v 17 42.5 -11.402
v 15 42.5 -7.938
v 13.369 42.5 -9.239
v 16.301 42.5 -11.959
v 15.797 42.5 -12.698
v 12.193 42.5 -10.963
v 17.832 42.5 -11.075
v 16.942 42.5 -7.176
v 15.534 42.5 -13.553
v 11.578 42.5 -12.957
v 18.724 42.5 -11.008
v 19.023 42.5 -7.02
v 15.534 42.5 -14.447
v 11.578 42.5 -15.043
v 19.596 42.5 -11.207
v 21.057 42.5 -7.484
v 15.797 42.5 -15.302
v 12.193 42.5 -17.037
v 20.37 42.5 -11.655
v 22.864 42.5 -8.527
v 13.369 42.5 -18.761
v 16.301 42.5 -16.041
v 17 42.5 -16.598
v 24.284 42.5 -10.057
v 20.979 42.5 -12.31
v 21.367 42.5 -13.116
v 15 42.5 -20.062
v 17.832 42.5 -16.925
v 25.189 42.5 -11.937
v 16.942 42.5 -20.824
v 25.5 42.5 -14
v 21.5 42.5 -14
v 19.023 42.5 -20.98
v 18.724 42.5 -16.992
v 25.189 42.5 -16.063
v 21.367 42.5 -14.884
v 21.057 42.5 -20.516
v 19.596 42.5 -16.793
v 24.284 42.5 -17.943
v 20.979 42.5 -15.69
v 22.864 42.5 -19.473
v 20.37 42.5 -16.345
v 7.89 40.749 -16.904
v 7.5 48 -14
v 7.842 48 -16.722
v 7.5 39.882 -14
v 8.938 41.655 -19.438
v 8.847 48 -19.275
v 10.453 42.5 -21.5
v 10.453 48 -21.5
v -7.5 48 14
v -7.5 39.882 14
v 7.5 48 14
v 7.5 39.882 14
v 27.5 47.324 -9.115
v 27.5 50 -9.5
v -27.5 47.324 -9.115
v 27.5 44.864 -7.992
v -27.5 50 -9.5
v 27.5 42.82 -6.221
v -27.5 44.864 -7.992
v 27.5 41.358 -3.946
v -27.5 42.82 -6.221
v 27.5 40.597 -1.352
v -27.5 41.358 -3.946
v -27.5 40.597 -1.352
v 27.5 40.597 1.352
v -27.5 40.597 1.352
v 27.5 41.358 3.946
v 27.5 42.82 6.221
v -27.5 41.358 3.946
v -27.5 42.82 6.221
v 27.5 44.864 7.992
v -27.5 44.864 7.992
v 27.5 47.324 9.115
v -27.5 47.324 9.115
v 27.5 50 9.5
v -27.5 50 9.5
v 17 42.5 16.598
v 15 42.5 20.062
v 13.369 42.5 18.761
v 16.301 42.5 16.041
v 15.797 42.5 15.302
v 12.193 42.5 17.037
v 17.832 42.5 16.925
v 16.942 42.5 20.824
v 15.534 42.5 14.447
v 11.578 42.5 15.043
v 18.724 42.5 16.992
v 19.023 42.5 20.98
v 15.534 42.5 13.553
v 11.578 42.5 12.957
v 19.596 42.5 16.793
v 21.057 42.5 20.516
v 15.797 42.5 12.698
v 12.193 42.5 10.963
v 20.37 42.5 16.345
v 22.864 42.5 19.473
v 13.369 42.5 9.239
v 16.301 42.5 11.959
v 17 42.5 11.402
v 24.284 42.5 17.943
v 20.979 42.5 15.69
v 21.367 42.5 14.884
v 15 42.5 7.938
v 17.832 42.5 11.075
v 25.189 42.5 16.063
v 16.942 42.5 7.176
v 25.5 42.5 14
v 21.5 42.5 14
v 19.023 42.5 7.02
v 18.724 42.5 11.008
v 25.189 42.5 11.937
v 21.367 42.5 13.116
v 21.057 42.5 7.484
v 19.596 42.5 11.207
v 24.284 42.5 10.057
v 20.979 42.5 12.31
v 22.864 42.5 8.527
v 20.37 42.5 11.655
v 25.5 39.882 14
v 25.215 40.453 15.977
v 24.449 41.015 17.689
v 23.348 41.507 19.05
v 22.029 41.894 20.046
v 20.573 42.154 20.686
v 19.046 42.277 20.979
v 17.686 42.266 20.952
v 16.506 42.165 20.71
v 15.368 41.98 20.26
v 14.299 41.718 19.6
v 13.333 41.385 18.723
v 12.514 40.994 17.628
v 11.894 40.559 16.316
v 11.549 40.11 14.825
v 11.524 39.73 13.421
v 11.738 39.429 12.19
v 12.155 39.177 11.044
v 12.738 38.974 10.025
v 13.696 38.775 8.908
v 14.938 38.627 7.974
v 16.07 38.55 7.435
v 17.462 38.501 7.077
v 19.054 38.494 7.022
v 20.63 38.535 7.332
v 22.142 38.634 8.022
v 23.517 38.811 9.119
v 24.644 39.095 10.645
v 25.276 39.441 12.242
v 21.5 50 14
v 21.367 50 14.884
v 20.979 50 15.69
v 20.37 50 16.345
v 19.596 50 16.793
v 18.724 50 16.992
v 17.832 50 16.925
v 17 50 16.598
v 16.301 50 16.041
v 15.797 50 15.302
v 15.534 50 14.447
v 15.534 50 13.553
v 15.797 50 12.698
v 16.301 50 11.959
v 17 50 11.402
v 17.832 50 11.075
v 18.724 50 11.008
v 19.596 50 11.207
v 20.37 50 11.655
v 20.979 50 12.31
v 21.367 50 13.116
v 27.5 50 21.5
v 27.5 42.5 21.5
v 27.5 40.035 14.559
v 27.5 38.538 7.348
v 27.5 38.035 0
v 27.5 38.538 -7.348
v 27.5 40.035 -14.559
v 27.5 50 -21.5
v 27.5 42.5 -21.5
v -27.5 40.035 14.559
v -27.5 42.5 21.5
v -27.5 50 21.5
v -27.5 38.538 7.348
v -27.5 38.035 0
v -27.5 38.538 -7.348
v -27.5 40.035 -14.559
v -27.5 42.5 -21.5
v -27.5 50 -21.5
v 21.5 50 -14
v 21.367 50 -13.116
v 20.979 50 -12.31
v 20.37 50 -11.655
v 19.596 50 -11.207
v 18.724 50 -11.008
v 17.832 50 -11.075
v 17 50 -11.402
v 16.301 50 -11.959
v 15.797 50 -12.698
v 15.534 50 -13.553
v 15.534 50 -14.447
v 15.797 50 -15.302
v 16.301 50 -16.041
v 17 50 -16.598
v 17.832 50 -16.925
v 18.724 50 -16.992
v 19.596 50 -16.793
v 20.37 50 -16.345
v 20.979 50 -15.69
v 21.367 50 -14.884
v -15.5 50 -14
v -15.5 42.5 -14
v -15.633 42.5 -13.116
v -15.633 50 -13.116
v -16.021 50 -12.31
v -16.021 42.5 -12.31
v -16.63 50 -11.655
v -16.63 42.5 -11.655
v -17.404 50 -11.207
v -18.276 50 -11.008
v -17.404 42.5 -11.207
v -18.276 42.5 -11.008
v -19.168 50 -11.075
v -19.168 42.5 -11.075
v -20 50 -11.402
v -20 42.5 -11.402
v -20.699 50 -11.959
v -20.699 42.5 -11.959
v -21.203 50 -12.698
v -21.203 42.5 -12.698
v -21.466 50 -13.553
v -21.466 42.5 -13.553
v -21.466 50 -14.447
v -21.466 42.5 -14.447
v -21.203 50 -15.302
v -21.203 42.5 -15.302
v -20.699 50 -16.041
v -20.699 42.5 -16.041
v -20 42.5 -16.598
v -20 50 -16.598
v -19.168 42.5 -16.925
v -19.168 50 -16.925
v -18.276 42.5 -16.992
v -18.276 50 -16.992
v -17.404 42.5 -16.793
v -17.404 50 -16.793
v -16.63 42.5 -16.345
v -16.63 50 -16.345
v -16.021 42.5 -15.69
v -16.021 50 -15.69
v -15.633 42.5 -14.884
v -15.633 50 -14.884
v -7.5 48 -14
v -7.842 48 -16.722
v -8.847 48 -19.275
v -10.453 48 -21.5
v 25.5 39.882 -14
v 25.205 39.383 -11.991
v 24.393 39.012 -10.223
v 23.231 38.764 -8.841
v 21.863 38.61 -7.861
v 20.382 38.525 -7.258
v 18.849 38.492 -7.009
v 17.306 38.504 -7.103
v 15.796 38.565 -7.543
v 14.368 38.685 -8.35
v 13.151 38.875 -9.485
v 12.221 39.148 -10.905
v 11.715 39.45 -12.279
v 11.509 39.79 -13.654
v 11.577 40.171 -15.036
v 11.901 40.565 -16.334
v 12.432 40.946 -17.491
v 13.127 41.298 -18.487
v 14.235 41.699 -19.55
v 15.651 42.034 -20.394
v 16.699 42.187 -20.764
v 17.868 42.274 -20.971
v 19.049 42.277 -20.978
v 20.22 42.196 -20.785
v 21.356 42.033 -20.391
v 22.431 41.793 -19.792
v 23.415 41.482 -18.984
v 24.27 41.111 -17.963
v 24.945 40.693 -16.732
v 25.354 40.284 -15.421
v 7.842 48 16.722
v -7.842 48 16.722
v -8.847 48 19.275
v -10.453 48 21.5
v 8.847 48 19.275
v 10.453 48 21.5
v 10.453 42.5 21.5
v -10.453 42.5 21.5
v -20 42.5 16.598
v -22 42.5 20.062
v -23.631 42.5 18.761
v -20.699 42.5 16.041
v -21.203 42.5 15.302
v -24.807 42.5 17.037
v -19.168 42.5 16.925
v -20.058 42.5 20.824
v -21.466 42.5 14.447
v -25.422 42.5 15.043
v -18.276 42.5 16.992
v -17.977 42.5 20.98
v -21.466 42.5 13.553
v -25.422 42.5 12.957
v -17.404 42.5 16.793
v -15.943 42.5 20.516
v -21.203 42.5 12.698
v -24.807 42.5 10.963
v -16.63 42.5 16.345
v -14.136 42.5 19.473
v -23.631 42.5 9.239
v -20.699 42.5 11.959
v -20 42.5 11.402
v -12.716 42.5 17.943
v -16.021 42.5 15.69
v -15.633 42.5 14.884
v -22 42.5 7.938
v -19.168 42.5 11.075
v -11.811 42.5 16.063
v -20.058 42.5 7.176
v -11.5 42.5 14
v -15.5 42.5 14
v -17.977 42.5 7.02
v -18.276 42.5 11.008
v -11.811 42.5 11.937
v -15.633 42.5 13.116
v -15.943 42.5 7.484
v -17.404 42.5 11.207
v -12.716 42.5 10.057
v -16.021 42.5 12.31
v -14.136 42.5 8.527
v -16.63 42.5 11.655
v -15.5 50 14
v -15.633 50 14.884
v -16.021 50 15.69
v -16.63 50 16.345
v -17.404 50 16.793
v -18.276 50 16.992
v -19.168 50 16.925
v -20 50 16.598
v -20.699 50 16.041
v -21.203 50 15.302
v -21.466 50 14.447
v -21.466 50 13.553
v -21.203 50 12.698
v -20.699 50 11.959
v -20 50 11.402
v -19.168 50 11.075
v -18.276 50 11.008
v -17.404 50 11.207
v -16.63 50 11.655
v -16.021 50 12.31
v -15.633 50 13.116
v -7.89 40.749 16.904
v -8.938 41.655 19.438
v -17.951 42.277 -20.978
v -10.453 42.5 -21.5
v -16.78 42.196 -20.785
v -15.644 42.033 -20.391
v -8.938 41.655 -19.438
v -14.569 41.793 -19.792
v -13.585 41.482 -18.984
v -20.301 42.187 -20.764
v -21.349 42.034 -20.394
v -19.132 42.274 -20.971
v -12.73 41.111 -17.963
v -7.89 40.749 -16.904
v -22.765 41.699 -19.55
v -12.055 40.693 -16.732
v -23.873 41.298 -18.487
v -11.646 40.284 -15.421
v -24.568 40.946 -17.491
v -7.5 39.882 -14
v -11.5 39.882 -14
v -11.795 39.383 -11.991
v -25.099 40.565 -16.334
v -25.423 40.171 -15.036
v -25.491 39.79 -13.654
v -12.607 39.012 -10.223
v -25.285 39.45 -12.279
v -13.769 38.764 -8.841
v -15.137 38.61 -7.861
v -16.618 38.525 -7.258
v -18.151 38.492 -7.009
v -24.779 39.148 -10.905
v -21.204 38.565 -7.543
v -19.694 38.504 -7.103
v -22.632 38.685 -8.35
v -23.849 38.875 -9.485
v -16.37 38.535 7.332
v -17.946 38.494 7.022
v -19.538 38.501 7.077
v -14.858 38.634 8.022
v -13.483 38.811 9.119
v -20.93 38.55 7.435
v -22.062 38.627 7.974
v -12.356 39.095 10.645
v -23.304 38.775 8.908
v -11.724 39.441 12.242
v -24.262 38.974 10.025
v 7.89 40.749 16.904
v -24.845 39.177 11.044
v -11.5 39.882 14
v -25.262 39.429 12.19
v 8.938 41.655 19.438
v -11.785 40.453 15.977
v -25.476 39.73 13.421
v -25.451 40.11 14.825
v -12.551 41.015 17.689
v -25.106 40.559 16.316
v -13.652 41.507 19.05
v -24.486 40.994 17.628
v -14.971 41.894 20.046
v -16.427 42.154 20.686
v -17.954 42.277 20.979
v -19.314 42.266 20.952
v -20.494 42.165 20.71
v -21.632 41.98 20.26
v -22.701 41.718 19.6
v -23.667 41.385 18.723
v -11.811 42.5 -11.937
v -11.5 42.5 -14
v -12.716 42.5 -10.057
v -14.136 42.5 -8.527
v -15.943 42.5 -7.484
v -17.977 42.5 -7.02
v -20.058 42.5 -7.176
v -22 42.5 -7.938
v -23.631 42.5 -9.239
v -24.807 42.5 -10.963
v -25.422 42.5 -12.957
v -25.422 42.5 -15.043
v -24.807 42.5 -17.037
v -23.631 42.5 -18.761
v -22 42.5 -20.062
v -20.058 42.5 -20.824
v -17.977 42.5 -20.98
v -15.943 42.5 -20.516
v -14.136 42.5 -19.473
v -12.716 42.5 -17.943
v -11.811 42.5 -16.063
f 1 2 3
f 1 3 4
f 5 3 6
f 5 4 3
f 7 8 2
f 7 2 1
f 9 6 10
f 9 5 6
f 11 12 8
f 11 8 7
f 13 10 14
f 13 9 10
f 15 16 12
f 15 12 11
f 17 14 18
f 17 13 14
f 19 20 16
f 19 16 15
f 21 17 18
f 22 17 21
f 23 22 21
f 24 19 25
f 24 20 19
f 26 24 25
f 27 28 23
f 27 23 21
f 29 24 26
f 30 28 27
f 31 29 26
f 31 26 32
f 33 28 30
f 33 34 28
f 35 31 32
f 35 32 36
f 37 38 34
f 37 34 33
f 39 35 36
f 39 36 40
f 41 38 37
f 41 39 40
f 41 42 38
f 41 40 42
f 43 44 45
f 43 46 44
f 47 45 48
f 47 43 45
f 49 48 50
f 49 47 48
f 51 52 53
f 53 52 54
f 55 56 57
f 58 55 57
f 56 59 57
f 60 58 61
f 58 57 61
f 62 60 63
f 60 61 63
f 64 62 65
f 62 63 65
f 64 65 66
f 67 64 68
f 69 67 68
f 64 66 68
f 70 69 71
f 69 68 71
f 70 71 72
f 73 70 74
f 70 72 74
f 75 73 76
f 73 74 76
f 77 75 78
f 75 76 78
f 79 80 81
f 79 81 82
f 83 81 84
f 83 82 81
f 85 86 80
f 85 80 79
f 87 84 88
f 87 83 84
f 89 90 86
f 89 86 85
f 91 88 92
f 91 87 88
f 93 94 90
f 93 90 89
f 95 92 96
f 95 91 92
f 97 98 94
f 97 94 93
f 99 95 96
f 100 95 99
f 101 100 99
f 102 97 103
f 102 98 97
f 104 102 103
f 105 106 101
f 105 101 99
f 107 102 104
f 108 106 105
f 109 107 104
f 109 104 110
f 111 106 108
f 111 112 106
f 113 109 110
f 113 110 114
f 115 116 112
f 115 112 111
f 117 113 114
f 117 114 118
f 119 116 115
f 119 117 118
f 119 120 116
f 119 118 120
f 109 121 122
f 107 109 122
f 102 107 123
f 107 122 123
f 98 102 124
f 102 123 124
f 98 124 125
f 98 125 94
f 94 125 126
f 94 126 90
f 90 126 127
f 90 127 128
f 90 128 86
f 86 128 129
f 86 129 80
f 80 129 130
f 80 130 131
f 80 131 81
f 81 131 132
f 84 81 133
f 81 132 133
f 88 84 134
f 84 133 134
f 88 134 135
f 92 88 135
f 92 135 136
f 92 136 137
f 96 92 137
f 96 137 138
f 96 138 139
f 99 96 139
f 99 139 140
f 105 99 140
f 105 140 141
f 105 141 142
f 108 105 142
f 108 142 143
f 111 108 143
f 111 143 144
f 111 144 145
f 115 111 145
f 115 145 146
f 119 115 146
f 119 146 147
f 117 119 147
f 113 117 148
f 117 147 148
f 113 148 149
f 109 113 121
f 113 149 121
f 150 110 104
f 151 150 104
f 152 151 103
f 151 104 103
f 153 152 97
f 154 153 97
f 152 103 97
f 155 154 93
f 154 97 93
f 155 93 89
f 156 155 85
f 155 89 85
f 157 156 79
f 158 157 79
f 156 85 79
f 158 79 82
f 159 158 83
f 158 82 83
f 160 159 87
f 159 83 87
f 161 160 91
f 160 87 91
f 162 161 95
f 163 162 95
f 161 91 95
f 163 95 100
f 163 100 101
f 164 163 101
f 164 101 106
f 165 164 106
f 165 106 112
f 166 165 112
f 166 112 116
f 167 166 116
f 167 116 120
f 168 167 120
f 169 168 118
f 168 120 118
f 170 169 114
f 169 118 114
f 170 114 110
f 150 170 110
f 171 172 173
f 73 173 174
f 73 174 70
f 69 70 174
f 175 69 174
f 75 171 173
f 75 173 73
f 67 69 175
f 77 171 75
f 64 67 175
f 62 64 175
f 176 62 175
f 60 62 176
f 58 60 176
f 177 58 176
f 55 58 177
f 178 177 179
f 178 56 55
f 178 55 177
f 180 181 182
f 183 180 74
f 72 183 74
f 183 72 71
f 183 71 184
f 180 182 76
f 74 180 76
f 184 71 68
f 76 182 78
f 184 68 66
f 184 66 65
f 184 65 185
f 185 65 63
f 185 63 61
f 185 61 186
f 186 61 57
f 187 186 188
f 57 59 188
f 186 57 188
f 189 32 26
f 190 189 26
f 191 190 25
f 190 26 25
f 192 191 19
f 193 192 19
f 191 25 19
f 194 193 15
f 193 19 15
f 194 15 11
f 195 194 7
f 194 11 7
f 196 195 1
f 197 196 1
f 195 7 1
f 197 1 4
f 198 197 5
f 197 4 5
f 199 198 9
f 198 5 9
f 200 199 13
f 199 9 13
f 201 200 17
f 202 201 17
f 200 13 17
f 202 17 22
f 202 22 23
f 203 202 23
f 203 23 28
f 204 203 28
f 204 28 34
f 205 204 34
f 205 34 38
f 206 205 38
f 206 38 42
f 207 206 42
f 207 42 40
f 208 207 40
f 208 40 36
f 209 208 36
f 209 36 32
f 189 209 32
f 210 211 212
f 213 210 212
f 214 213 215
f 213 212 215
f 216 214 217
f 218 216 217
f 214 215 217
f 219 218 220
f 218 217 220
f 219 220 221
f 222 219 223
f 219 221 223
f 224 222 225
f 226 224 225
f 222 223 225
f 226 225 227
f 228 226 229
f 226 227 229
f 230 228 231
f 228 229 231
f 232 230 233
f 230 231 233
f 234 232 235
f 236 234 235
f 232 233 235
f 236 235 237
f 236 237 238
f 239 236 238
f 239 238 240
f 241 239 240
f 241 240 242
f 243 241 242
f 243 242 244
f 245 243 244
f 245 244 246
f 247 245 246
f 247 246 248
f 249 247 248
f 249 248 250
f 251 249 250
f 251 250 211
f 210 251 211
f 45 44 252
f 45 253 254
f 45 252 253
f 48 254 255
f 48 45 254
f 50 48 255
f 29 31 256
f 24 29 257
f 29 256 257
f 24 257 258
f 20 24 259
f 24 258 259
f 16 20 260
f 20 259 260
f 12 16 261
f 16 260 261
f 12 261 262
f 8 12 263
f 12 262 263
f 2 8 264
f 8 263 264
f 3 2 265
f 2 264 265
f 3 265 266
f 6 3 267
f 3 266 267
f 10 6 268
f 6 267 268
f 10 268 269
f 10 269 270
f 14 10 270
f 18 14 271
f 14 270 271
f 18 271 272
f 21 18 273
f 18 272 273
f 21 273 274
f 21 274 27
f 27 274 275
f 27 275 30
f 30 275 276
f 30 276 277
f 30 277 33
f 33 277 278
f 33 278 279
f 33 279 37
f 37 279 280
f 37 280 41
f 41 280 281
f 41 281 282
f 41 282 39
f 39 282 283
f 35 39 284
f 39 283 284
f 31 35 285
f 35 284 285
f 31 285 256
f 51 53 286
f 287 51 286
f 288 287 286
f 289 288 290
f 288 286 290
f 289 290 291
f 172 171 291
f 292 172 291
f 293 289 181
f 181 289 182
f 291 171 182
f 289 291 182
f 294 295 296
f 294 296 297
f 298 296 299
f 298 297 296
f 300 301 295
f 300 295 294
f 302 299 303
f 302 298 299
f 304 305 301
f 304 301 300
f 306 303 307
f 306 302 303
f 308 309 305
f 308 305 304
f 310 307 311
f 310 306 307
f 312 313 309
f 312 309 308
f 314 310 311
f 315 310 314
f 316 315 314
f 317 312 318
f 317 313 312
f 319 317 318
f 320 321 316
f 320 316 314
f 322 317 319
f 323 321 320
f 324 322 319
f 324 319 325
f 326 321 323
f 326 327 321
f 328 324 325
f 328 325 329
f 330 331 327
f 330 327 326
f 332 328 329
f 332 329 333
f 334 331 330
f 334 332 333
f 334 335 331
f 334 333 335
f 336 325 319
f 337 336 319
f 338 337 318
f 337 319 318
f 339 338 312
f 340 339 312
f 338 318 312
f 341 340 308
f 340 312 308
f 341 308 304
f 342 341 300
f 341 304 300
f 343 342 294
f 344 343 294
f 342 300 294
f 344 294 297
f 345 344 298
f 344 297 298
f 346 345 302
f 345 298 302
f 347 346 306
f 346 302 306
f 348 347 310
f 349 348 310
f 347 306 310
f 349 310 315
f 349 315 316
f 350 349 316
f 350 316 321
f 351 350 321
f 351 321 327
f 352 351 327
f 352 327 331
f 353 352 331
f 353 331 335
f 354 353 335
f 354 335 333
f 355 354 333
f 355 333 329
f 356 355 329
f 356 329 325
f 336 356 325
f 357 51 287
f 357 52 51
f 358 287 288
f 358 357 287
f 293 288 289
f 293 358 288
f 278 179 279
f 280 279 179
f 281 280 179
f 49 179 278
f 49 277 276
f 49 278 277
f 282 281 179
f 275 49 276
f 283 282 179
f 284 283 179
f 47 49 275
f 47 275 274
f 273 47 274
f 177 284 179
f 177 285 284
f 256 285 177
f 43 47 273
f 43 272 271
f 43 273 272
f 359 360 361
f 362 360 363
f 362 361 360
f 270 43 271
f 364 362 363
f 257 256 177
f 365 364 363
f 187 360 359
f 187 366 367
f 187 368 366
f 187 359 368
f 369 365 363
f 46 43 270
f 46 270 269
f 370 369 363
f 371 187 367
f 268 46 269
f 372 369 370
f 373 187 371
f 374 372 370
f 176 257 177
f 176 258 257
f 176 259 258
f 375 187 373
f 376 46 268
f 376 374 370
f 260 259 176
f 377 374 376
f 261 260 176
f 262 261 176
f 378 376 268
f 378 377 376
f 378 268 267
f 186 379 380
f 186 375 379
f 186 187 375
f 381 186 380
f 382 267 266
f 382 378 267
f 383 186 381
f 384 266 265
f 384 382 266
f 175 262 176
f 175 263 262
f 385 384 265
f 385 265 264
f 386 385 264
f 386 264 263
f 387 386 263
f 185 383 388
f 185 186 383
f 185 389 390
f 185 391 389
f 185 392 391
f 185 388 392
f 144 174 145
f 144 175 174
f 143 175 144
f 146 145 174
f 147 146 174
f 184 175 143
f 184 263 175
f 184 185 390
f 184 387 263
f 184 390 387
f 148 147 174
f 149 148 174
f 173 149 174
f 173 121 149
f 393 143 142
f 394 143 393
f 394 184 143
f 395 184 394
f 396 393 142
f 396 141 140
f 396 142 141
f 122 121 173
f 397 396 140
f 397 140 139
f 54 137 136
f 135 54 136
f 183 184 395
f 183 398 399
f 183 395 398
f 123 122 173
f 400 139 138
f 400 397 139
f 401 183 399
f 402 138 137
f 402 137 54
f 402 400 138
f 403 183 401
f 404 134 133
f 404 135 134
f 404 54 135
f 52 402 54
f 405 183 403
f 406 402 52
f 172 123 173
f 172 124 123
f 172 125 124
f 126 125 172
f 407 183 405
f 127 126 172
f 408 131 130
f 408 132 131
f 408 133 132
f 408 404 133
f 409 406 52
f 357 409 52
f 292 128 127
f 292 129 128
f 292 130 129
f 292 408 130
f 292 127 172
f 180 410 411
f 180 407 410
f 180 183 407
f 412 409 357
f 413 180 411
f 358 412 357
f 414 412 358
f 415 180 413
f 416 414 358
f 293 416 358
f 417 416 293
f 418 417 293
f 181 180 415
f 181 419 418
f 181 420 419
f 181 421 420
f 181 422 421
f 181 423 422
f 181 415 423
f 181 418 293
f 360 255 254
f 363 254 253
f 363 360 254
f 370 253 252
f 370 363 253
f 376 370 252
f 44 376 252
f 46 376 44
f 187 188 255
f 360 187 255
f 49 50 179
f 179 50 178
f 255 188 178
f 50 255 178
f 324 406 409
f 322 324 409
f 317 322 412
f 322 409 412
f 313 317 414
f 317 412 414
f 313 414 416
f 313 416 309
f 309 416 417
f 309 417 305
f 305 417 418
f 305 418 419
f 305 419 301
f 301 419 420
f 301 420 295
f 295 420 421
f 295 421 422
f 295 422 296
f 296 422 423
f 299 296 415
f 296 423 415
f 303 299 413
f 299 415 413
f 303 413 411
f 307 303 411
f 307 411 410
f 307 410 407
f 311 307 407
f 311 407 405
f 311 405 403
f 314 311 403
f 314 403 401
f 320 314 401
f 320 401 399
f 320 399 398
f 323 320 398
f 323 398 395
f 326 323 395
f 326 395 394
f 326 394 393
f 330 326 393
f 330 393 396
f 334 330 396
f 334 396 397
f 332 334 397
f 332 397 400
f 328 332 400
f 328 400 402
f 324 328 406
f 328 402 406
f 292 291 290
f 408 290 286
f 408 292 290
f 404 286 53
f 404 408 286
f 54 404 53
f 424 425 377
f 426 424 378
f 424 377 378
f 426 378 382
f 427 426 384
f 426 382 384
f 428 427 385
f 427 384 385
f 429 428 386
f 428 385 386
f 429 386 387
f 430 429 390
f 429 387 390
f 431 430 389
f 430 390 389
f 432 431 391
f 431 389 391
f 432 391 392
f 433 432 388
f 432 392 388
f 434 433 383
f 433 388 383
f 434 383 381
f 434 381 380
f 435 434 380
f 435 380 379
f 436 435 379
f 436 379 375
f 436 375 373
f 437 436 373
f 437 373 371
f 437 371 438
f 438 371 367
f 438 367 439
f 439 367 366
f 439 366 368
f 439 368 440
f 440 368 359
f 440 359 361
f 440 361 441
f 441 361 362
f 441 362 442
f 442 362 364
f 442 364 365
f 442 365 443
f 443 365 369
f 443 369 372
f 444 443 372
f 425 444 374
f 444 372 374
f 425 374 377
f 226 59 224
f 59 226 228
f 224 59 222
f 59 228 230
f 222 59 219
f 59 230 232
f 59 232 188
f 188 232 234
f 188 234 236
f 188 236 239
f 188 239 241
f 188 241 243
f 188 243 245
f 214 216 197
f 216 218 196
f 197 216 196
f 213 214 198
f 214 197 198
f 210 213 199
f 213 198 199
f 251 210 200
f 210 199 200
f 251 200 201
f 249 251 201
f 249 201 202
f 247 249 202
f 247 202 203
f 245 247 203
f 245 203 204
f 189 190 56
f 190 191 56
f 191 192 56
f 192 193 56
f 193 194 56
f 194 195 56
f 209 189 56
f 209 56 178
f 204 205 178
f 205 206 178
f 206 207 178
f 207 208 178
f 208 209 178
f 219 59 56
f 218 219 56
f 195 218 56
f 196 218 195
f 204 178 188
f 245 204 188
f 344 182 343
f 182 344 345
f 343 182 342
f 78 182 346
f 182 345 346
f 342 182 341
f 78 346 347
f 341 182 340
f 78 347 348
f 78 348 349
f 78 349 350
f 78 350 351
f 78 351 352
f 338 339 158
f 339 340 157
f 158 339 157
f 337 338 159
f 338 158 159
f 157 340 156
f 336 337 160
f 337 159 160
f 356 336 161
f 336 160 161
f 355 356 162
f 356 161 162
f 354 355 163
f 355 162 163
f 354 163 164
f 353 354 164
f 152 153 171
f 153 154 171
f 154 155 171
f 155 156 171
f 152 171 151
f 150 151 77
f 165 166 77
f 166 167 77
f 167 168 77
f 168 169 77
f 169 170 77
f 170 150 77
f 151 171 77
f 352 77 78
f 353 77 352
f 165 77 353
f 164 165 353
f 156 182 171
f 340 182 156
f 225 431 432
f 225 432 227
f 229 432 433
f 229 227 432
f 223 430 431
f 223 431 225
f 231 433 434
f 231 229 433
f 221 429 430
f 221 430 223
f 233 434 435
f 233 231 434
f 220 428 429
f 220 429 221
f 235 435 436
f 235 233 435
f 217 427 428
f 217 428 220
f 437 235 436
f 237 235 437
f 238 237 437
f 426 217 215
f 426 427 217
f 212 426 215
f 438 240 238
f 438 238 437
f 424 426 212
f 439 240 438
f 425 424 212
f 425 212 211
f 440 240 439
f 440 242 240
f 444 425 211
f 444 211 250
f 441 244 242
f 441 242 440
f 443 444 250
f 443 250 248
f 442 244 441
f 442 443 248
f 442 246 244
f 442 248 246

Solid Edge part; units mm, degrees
sketch "Sketch1" plane through (0, 50, 11.75) normal (0, -1, 0) x (1, 0, 0)
  line L0 (-27.5, -33.25) -> (27.5, -33.25)
  line L1 (27.5, 9.75) -> (27.5, -33.25)
  line L2 (27.5, 9.75) -> (-27.5, 9.75)
  line L3 (-27.5, 9.75) -> (-27.5, -33.25)
  dimension "D1" = 55
  dimension "D2" = 43
extrude "ExtrudedProtrusion_2" add sketch "Sketch1" along normal blind 12
sketch "Sketch2" plane through (0, 0, 0) normal (1, 0, 0) x (0, 1, 0)
  arc A0 (50, -9.5) -> (50, 9.5) centre (50, 0) cw
  line L0 (50, 9.5) -> (50, -9.5)
  dimension "D1" = 9.5
  dimension "D2" = 19
extrude "Cutout1" cut sketch "Sketch2" along normal through all and the other way through all
sketch "Sketch3" plane through (-27.5, 44, 0) normal (-1, 0, 0) x (0, 0, -1)
  line L0 (27.9876, -6) -> (21.5, -6)
  line L1 (21.5, -6) -> (21.5, 1.5)
  arc A0 (-21.5, 1.5) -> (21.5, 1.5) centre (0, -48.0353) cw
  line L2 (-21.5, -6) -> (-21.5, 1.5)
  line L3 (-21.5, -6) -> (-27.4197, -6)
  line L4 (-27.4197, -6) -> (-27.4197, 18.1819)
  line L5 (-27.4197, 18.1819) -> (27.9876, 18.1819)
  line L6 (27.9876, 18.1819) -> (27.9876, -6)
  dimension "D1" = 7.5
  dimension "D2" = 54
extrude "Cutout2" cut sketch "Sketch3" against normal up to next
sketch "Sketch4" plane through (0, 38, 0) normal (0, -1, 0) x (1, 0, 0)
  circle A0 centre (-18.5, -14) radius 3
  circle A1 centre (18.5, -14) radius 3
  circle A2 centre (18.5, 14) radius 3
  circle A3 centre (-18.5, 14) radius 3
  dimension "D1" = 7.5
  dimension "D2" = 9
  dimension "D3" = 9
extrude "Cutout3" cut sketch "Sketch4" against normal through all
sketch "Sketch5" plane through (0, 38, 0) normal (0, -1, 0) x (1, 0, 0)
  circle A0 centre (-18.5, 14) radius 7
  circle A1 centre (18.5, 14) radius 7
  circle A2 centre (-18.5, -14) radius 7
  circle A3 centre (18.5, -14) radius 7
extrude "Cutout4" cut sketch "Sketch5" against normal blind 4.5
sketch "Sketch6" plane through (0, 38, 0) normal (0, -1, 0) x (1, 0, 0)
  arc A0 (11, -22.0467) -> (7.5, -14) centre (18.5, -14) cw
  line L0 (-7.5, -14) -> (7.5, -14)
  arc A1 (-11, -22.0467) -> (-7.5, -14) centre (-18.5, -14) ccw
  line L1 (-11, -22.0467) -> (11, -22.0467)
  line L2 (-11, 22.0467) -> (11, 22.0467)
  arc A2 (7.5, 14) -> (11, 22.0467) centre (18.5, 14) cw
  line L3 (-7.5, 14) -> (7.5, 14)
  arc A3 (-7.5, 14) -> (-11, 22.0467) centre (-18.5, 14) ccw
  dimension "D1" = 11
  dimension "D2" = 15
  dimension "D3" = 7.5
  dimension "D4" = 22
extrude "ExtrudedCutout_9" cut sketch "Sketch6" against normal blind 10
properties material "Aluminum, 1060"
